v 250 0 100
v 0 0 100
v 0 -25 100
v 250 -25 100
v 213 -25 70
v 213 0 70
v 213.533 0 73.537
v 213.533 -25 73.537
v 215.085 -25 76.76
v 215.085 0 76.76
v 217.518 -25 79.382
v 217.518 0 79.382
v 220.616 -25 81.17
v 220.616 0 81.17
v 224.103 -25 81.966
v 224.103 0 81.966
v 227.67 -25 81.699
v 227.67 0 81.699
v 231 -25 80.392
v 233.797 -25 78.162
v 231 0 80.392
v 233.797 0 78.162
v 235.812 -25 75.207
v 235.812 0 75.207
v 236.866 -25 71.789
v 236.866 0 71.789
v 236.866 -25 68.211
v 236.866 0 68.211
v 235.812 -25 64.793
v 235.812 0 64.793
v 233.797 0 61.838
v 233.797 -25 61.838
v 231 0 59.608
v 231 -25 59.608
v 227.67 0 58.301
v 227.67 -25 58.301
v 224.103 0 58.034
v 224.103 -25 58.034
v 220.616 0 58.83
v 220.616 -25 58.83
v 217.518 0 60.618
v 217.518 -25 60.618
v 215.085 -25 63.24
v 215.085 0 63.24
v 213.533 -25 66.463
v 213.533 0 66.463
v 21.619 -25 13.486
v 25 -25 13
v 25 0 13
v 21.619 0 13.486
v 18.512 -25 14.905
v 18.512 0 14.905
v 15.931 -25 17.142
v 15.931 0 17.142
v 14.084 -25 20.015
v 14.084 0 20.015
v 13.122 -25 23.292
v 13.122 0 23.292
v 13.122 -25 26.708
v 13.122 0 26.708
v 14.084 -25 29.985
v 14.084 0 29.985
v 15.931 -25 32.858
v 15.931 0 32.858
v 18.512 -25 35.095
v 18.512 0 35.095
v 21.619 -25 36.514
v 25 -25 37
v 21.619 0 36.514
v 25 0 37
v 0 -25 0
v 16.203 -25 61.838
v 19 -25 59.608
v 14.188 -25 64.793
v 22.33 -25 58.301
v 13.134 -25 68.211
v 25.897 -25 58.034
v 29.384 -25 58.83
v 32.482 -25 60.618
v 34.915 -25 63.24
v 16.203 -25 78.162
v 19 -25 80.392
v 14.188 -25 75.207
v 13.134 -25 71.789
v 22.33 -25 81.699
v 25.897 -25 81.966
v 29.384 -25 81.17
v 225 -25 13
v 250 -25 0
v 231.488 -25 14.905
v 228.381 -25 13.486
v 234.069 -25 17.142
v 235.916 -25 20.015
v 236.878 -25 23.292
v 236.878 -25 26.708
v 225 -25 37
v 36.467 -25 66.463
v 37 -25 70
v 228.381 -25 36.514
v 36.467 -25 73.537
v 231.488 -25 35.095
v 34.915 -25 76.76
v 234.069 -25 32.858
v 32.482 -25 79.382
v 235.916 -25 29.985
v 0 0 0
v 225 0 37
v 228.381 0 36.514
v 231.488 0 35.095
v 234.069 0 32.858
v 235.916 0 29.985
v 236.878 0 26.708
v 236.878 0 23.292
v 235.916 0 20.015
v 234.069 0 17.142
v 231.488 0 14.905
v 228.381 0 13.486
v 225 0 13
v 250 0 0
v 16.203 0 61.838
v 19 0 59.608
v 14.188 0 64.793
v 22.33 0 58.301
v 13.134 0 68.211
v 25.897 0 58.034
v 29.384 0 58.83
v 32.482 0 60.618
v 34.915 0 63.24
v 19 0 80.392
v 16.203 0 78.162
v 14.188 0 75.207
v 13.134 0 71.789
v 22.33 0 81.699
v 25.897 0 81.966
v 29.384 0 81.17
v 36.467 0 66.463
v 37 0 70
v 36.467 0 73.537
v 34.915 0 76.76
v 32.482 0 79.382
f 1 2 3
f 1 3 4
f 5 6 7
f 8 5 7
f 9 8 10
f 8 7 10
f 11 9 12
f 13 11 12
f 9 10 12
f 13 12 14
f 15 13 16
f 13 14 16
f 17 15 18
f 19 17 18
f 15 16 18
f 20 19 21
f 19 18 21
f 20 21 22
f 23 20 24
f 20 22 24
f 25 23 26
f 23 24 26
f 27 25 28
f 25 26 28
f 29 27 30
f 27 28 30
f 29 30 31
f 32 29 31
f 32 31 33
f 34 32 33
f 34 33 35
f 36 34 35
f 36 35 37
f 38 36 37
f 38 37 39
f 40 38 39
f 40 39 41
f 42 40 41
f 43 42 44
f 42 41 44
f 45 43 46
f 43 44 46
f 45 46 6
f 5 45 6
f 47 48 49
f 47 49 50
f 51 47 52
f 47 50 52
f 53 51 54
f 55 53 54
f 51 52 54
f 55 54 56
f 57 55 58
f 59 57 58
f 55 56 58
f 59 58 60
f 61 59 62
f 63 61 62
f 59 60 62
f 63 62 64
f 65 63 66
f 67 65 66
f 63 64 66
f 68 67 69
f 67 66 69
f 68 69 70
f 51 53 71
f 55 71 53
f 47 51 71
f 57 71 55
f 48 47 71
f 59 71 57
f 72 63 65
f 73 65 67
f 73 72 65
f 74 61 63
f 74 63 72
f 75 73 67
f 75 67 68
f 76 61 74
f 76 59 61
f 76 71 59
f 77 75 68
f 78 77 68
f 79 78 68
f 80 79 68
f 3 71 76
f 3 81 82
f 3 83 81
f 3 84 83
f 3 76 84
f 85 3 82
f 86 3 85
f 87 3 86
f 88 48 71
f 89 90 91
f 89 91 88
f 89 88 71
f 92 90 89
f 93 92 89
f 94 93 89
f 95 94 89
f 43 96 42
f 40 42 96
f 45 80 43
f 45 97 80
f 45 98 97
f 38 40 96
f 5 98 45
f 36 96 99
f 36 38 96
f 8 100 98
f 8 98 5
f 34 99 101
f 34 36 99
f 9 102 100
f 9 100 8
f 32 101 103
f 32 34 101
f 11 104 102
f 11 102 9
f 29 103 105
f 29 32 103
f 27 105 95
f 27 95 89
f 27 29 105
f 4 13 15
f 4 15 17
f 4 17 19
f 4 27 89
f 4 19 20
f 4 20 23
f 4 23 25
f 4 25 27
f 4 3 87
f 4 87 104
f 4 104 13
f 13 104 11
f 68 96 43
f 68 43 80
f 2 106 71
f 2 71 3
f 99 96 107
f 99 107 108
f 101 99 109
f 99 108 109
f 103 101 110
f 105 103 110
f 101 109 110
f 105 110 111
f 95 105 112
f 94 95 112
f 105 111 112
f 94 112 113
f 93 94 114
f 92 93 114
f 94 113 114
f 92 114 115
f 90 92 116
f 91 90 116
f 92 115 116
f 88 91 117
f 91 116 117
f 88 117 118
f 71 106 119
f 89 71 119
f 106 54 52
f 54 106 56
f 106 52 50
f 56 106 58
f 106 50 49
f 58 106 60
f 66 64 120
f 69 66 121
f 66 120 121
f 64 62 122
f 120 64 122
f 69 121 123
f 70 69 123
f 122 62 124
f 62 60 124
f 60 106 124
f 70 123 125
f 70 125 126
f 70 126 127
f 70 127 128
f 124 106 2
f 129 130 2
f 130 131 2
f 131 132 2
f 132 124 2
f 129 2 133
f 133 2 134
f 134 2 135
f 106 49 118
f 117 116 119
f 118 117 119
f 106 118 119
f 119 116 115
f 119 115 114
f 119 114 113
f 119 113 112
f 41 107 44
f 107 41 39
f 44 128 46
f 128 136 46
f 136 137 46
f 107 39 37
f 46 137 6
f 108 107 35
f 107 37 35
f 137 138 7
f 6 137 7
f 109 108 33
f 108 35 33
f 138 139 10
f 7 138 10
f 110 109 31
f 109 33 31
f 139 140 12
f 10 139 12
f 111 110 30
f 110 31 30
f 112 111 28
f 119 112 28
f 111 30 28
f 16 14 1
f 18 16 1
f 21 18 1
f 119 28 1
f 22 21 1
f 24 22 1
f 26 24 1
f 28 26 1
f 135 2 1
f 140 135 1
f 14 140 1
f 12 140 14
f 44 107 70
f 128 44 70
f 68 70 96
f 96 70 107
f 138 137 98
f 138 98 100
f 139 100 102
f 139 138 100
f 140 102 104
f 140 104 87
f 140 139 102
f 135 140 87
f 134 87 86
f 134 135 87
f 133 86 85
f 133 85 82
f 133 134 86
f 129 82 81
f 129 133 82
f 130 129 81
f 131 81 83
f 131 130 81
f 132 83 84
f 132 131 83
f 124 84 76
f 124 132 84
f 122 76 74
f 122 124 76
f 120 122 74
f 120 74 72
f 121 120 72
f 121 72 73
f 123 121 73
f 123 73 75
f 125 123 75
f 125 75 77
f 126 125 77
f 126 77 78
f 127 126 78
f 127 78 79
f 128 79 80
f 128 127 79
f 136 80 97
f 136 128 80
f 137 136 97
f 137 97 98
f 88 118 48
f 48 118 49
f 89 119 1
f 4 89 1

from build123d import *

# Parameters (mm, degrees)
F0_W     = 250
F0_H     = 100
F0_R     = 12
F1_DEPTH = 25


with BuildPart() as f1:
    # F0 (on Front) → F1 (new body)
    with BuildSketch(Plane.XZ):
        with Locations((125, 50)):
            Rectangle(F0_W, F0_H)
        with BuildLine():
            ThreePointArc((225, 37), (237, 25), (225, 13))
            Line((225, 13), (25, 13))
            ThreePointArc((25, 13), (13, 25), (25, 37))
            Line((25, 37), (225, 37))
        make_face(mode=Mode.SUBTRACT)
        with Locations((25, 70)):
            Circle(F0_R, mode=Mode.SUBTRACT)
        with BuildLine():
            ThreePointArc((237, 70), (225, 58), (213, 70))
            ThreePointArc((213, 70), (225, 82), (237, 70))
        make_face(mode=Mode.SUBTRACT)
    extrude(amount=F1_DEPTH)


solid = f1.part
